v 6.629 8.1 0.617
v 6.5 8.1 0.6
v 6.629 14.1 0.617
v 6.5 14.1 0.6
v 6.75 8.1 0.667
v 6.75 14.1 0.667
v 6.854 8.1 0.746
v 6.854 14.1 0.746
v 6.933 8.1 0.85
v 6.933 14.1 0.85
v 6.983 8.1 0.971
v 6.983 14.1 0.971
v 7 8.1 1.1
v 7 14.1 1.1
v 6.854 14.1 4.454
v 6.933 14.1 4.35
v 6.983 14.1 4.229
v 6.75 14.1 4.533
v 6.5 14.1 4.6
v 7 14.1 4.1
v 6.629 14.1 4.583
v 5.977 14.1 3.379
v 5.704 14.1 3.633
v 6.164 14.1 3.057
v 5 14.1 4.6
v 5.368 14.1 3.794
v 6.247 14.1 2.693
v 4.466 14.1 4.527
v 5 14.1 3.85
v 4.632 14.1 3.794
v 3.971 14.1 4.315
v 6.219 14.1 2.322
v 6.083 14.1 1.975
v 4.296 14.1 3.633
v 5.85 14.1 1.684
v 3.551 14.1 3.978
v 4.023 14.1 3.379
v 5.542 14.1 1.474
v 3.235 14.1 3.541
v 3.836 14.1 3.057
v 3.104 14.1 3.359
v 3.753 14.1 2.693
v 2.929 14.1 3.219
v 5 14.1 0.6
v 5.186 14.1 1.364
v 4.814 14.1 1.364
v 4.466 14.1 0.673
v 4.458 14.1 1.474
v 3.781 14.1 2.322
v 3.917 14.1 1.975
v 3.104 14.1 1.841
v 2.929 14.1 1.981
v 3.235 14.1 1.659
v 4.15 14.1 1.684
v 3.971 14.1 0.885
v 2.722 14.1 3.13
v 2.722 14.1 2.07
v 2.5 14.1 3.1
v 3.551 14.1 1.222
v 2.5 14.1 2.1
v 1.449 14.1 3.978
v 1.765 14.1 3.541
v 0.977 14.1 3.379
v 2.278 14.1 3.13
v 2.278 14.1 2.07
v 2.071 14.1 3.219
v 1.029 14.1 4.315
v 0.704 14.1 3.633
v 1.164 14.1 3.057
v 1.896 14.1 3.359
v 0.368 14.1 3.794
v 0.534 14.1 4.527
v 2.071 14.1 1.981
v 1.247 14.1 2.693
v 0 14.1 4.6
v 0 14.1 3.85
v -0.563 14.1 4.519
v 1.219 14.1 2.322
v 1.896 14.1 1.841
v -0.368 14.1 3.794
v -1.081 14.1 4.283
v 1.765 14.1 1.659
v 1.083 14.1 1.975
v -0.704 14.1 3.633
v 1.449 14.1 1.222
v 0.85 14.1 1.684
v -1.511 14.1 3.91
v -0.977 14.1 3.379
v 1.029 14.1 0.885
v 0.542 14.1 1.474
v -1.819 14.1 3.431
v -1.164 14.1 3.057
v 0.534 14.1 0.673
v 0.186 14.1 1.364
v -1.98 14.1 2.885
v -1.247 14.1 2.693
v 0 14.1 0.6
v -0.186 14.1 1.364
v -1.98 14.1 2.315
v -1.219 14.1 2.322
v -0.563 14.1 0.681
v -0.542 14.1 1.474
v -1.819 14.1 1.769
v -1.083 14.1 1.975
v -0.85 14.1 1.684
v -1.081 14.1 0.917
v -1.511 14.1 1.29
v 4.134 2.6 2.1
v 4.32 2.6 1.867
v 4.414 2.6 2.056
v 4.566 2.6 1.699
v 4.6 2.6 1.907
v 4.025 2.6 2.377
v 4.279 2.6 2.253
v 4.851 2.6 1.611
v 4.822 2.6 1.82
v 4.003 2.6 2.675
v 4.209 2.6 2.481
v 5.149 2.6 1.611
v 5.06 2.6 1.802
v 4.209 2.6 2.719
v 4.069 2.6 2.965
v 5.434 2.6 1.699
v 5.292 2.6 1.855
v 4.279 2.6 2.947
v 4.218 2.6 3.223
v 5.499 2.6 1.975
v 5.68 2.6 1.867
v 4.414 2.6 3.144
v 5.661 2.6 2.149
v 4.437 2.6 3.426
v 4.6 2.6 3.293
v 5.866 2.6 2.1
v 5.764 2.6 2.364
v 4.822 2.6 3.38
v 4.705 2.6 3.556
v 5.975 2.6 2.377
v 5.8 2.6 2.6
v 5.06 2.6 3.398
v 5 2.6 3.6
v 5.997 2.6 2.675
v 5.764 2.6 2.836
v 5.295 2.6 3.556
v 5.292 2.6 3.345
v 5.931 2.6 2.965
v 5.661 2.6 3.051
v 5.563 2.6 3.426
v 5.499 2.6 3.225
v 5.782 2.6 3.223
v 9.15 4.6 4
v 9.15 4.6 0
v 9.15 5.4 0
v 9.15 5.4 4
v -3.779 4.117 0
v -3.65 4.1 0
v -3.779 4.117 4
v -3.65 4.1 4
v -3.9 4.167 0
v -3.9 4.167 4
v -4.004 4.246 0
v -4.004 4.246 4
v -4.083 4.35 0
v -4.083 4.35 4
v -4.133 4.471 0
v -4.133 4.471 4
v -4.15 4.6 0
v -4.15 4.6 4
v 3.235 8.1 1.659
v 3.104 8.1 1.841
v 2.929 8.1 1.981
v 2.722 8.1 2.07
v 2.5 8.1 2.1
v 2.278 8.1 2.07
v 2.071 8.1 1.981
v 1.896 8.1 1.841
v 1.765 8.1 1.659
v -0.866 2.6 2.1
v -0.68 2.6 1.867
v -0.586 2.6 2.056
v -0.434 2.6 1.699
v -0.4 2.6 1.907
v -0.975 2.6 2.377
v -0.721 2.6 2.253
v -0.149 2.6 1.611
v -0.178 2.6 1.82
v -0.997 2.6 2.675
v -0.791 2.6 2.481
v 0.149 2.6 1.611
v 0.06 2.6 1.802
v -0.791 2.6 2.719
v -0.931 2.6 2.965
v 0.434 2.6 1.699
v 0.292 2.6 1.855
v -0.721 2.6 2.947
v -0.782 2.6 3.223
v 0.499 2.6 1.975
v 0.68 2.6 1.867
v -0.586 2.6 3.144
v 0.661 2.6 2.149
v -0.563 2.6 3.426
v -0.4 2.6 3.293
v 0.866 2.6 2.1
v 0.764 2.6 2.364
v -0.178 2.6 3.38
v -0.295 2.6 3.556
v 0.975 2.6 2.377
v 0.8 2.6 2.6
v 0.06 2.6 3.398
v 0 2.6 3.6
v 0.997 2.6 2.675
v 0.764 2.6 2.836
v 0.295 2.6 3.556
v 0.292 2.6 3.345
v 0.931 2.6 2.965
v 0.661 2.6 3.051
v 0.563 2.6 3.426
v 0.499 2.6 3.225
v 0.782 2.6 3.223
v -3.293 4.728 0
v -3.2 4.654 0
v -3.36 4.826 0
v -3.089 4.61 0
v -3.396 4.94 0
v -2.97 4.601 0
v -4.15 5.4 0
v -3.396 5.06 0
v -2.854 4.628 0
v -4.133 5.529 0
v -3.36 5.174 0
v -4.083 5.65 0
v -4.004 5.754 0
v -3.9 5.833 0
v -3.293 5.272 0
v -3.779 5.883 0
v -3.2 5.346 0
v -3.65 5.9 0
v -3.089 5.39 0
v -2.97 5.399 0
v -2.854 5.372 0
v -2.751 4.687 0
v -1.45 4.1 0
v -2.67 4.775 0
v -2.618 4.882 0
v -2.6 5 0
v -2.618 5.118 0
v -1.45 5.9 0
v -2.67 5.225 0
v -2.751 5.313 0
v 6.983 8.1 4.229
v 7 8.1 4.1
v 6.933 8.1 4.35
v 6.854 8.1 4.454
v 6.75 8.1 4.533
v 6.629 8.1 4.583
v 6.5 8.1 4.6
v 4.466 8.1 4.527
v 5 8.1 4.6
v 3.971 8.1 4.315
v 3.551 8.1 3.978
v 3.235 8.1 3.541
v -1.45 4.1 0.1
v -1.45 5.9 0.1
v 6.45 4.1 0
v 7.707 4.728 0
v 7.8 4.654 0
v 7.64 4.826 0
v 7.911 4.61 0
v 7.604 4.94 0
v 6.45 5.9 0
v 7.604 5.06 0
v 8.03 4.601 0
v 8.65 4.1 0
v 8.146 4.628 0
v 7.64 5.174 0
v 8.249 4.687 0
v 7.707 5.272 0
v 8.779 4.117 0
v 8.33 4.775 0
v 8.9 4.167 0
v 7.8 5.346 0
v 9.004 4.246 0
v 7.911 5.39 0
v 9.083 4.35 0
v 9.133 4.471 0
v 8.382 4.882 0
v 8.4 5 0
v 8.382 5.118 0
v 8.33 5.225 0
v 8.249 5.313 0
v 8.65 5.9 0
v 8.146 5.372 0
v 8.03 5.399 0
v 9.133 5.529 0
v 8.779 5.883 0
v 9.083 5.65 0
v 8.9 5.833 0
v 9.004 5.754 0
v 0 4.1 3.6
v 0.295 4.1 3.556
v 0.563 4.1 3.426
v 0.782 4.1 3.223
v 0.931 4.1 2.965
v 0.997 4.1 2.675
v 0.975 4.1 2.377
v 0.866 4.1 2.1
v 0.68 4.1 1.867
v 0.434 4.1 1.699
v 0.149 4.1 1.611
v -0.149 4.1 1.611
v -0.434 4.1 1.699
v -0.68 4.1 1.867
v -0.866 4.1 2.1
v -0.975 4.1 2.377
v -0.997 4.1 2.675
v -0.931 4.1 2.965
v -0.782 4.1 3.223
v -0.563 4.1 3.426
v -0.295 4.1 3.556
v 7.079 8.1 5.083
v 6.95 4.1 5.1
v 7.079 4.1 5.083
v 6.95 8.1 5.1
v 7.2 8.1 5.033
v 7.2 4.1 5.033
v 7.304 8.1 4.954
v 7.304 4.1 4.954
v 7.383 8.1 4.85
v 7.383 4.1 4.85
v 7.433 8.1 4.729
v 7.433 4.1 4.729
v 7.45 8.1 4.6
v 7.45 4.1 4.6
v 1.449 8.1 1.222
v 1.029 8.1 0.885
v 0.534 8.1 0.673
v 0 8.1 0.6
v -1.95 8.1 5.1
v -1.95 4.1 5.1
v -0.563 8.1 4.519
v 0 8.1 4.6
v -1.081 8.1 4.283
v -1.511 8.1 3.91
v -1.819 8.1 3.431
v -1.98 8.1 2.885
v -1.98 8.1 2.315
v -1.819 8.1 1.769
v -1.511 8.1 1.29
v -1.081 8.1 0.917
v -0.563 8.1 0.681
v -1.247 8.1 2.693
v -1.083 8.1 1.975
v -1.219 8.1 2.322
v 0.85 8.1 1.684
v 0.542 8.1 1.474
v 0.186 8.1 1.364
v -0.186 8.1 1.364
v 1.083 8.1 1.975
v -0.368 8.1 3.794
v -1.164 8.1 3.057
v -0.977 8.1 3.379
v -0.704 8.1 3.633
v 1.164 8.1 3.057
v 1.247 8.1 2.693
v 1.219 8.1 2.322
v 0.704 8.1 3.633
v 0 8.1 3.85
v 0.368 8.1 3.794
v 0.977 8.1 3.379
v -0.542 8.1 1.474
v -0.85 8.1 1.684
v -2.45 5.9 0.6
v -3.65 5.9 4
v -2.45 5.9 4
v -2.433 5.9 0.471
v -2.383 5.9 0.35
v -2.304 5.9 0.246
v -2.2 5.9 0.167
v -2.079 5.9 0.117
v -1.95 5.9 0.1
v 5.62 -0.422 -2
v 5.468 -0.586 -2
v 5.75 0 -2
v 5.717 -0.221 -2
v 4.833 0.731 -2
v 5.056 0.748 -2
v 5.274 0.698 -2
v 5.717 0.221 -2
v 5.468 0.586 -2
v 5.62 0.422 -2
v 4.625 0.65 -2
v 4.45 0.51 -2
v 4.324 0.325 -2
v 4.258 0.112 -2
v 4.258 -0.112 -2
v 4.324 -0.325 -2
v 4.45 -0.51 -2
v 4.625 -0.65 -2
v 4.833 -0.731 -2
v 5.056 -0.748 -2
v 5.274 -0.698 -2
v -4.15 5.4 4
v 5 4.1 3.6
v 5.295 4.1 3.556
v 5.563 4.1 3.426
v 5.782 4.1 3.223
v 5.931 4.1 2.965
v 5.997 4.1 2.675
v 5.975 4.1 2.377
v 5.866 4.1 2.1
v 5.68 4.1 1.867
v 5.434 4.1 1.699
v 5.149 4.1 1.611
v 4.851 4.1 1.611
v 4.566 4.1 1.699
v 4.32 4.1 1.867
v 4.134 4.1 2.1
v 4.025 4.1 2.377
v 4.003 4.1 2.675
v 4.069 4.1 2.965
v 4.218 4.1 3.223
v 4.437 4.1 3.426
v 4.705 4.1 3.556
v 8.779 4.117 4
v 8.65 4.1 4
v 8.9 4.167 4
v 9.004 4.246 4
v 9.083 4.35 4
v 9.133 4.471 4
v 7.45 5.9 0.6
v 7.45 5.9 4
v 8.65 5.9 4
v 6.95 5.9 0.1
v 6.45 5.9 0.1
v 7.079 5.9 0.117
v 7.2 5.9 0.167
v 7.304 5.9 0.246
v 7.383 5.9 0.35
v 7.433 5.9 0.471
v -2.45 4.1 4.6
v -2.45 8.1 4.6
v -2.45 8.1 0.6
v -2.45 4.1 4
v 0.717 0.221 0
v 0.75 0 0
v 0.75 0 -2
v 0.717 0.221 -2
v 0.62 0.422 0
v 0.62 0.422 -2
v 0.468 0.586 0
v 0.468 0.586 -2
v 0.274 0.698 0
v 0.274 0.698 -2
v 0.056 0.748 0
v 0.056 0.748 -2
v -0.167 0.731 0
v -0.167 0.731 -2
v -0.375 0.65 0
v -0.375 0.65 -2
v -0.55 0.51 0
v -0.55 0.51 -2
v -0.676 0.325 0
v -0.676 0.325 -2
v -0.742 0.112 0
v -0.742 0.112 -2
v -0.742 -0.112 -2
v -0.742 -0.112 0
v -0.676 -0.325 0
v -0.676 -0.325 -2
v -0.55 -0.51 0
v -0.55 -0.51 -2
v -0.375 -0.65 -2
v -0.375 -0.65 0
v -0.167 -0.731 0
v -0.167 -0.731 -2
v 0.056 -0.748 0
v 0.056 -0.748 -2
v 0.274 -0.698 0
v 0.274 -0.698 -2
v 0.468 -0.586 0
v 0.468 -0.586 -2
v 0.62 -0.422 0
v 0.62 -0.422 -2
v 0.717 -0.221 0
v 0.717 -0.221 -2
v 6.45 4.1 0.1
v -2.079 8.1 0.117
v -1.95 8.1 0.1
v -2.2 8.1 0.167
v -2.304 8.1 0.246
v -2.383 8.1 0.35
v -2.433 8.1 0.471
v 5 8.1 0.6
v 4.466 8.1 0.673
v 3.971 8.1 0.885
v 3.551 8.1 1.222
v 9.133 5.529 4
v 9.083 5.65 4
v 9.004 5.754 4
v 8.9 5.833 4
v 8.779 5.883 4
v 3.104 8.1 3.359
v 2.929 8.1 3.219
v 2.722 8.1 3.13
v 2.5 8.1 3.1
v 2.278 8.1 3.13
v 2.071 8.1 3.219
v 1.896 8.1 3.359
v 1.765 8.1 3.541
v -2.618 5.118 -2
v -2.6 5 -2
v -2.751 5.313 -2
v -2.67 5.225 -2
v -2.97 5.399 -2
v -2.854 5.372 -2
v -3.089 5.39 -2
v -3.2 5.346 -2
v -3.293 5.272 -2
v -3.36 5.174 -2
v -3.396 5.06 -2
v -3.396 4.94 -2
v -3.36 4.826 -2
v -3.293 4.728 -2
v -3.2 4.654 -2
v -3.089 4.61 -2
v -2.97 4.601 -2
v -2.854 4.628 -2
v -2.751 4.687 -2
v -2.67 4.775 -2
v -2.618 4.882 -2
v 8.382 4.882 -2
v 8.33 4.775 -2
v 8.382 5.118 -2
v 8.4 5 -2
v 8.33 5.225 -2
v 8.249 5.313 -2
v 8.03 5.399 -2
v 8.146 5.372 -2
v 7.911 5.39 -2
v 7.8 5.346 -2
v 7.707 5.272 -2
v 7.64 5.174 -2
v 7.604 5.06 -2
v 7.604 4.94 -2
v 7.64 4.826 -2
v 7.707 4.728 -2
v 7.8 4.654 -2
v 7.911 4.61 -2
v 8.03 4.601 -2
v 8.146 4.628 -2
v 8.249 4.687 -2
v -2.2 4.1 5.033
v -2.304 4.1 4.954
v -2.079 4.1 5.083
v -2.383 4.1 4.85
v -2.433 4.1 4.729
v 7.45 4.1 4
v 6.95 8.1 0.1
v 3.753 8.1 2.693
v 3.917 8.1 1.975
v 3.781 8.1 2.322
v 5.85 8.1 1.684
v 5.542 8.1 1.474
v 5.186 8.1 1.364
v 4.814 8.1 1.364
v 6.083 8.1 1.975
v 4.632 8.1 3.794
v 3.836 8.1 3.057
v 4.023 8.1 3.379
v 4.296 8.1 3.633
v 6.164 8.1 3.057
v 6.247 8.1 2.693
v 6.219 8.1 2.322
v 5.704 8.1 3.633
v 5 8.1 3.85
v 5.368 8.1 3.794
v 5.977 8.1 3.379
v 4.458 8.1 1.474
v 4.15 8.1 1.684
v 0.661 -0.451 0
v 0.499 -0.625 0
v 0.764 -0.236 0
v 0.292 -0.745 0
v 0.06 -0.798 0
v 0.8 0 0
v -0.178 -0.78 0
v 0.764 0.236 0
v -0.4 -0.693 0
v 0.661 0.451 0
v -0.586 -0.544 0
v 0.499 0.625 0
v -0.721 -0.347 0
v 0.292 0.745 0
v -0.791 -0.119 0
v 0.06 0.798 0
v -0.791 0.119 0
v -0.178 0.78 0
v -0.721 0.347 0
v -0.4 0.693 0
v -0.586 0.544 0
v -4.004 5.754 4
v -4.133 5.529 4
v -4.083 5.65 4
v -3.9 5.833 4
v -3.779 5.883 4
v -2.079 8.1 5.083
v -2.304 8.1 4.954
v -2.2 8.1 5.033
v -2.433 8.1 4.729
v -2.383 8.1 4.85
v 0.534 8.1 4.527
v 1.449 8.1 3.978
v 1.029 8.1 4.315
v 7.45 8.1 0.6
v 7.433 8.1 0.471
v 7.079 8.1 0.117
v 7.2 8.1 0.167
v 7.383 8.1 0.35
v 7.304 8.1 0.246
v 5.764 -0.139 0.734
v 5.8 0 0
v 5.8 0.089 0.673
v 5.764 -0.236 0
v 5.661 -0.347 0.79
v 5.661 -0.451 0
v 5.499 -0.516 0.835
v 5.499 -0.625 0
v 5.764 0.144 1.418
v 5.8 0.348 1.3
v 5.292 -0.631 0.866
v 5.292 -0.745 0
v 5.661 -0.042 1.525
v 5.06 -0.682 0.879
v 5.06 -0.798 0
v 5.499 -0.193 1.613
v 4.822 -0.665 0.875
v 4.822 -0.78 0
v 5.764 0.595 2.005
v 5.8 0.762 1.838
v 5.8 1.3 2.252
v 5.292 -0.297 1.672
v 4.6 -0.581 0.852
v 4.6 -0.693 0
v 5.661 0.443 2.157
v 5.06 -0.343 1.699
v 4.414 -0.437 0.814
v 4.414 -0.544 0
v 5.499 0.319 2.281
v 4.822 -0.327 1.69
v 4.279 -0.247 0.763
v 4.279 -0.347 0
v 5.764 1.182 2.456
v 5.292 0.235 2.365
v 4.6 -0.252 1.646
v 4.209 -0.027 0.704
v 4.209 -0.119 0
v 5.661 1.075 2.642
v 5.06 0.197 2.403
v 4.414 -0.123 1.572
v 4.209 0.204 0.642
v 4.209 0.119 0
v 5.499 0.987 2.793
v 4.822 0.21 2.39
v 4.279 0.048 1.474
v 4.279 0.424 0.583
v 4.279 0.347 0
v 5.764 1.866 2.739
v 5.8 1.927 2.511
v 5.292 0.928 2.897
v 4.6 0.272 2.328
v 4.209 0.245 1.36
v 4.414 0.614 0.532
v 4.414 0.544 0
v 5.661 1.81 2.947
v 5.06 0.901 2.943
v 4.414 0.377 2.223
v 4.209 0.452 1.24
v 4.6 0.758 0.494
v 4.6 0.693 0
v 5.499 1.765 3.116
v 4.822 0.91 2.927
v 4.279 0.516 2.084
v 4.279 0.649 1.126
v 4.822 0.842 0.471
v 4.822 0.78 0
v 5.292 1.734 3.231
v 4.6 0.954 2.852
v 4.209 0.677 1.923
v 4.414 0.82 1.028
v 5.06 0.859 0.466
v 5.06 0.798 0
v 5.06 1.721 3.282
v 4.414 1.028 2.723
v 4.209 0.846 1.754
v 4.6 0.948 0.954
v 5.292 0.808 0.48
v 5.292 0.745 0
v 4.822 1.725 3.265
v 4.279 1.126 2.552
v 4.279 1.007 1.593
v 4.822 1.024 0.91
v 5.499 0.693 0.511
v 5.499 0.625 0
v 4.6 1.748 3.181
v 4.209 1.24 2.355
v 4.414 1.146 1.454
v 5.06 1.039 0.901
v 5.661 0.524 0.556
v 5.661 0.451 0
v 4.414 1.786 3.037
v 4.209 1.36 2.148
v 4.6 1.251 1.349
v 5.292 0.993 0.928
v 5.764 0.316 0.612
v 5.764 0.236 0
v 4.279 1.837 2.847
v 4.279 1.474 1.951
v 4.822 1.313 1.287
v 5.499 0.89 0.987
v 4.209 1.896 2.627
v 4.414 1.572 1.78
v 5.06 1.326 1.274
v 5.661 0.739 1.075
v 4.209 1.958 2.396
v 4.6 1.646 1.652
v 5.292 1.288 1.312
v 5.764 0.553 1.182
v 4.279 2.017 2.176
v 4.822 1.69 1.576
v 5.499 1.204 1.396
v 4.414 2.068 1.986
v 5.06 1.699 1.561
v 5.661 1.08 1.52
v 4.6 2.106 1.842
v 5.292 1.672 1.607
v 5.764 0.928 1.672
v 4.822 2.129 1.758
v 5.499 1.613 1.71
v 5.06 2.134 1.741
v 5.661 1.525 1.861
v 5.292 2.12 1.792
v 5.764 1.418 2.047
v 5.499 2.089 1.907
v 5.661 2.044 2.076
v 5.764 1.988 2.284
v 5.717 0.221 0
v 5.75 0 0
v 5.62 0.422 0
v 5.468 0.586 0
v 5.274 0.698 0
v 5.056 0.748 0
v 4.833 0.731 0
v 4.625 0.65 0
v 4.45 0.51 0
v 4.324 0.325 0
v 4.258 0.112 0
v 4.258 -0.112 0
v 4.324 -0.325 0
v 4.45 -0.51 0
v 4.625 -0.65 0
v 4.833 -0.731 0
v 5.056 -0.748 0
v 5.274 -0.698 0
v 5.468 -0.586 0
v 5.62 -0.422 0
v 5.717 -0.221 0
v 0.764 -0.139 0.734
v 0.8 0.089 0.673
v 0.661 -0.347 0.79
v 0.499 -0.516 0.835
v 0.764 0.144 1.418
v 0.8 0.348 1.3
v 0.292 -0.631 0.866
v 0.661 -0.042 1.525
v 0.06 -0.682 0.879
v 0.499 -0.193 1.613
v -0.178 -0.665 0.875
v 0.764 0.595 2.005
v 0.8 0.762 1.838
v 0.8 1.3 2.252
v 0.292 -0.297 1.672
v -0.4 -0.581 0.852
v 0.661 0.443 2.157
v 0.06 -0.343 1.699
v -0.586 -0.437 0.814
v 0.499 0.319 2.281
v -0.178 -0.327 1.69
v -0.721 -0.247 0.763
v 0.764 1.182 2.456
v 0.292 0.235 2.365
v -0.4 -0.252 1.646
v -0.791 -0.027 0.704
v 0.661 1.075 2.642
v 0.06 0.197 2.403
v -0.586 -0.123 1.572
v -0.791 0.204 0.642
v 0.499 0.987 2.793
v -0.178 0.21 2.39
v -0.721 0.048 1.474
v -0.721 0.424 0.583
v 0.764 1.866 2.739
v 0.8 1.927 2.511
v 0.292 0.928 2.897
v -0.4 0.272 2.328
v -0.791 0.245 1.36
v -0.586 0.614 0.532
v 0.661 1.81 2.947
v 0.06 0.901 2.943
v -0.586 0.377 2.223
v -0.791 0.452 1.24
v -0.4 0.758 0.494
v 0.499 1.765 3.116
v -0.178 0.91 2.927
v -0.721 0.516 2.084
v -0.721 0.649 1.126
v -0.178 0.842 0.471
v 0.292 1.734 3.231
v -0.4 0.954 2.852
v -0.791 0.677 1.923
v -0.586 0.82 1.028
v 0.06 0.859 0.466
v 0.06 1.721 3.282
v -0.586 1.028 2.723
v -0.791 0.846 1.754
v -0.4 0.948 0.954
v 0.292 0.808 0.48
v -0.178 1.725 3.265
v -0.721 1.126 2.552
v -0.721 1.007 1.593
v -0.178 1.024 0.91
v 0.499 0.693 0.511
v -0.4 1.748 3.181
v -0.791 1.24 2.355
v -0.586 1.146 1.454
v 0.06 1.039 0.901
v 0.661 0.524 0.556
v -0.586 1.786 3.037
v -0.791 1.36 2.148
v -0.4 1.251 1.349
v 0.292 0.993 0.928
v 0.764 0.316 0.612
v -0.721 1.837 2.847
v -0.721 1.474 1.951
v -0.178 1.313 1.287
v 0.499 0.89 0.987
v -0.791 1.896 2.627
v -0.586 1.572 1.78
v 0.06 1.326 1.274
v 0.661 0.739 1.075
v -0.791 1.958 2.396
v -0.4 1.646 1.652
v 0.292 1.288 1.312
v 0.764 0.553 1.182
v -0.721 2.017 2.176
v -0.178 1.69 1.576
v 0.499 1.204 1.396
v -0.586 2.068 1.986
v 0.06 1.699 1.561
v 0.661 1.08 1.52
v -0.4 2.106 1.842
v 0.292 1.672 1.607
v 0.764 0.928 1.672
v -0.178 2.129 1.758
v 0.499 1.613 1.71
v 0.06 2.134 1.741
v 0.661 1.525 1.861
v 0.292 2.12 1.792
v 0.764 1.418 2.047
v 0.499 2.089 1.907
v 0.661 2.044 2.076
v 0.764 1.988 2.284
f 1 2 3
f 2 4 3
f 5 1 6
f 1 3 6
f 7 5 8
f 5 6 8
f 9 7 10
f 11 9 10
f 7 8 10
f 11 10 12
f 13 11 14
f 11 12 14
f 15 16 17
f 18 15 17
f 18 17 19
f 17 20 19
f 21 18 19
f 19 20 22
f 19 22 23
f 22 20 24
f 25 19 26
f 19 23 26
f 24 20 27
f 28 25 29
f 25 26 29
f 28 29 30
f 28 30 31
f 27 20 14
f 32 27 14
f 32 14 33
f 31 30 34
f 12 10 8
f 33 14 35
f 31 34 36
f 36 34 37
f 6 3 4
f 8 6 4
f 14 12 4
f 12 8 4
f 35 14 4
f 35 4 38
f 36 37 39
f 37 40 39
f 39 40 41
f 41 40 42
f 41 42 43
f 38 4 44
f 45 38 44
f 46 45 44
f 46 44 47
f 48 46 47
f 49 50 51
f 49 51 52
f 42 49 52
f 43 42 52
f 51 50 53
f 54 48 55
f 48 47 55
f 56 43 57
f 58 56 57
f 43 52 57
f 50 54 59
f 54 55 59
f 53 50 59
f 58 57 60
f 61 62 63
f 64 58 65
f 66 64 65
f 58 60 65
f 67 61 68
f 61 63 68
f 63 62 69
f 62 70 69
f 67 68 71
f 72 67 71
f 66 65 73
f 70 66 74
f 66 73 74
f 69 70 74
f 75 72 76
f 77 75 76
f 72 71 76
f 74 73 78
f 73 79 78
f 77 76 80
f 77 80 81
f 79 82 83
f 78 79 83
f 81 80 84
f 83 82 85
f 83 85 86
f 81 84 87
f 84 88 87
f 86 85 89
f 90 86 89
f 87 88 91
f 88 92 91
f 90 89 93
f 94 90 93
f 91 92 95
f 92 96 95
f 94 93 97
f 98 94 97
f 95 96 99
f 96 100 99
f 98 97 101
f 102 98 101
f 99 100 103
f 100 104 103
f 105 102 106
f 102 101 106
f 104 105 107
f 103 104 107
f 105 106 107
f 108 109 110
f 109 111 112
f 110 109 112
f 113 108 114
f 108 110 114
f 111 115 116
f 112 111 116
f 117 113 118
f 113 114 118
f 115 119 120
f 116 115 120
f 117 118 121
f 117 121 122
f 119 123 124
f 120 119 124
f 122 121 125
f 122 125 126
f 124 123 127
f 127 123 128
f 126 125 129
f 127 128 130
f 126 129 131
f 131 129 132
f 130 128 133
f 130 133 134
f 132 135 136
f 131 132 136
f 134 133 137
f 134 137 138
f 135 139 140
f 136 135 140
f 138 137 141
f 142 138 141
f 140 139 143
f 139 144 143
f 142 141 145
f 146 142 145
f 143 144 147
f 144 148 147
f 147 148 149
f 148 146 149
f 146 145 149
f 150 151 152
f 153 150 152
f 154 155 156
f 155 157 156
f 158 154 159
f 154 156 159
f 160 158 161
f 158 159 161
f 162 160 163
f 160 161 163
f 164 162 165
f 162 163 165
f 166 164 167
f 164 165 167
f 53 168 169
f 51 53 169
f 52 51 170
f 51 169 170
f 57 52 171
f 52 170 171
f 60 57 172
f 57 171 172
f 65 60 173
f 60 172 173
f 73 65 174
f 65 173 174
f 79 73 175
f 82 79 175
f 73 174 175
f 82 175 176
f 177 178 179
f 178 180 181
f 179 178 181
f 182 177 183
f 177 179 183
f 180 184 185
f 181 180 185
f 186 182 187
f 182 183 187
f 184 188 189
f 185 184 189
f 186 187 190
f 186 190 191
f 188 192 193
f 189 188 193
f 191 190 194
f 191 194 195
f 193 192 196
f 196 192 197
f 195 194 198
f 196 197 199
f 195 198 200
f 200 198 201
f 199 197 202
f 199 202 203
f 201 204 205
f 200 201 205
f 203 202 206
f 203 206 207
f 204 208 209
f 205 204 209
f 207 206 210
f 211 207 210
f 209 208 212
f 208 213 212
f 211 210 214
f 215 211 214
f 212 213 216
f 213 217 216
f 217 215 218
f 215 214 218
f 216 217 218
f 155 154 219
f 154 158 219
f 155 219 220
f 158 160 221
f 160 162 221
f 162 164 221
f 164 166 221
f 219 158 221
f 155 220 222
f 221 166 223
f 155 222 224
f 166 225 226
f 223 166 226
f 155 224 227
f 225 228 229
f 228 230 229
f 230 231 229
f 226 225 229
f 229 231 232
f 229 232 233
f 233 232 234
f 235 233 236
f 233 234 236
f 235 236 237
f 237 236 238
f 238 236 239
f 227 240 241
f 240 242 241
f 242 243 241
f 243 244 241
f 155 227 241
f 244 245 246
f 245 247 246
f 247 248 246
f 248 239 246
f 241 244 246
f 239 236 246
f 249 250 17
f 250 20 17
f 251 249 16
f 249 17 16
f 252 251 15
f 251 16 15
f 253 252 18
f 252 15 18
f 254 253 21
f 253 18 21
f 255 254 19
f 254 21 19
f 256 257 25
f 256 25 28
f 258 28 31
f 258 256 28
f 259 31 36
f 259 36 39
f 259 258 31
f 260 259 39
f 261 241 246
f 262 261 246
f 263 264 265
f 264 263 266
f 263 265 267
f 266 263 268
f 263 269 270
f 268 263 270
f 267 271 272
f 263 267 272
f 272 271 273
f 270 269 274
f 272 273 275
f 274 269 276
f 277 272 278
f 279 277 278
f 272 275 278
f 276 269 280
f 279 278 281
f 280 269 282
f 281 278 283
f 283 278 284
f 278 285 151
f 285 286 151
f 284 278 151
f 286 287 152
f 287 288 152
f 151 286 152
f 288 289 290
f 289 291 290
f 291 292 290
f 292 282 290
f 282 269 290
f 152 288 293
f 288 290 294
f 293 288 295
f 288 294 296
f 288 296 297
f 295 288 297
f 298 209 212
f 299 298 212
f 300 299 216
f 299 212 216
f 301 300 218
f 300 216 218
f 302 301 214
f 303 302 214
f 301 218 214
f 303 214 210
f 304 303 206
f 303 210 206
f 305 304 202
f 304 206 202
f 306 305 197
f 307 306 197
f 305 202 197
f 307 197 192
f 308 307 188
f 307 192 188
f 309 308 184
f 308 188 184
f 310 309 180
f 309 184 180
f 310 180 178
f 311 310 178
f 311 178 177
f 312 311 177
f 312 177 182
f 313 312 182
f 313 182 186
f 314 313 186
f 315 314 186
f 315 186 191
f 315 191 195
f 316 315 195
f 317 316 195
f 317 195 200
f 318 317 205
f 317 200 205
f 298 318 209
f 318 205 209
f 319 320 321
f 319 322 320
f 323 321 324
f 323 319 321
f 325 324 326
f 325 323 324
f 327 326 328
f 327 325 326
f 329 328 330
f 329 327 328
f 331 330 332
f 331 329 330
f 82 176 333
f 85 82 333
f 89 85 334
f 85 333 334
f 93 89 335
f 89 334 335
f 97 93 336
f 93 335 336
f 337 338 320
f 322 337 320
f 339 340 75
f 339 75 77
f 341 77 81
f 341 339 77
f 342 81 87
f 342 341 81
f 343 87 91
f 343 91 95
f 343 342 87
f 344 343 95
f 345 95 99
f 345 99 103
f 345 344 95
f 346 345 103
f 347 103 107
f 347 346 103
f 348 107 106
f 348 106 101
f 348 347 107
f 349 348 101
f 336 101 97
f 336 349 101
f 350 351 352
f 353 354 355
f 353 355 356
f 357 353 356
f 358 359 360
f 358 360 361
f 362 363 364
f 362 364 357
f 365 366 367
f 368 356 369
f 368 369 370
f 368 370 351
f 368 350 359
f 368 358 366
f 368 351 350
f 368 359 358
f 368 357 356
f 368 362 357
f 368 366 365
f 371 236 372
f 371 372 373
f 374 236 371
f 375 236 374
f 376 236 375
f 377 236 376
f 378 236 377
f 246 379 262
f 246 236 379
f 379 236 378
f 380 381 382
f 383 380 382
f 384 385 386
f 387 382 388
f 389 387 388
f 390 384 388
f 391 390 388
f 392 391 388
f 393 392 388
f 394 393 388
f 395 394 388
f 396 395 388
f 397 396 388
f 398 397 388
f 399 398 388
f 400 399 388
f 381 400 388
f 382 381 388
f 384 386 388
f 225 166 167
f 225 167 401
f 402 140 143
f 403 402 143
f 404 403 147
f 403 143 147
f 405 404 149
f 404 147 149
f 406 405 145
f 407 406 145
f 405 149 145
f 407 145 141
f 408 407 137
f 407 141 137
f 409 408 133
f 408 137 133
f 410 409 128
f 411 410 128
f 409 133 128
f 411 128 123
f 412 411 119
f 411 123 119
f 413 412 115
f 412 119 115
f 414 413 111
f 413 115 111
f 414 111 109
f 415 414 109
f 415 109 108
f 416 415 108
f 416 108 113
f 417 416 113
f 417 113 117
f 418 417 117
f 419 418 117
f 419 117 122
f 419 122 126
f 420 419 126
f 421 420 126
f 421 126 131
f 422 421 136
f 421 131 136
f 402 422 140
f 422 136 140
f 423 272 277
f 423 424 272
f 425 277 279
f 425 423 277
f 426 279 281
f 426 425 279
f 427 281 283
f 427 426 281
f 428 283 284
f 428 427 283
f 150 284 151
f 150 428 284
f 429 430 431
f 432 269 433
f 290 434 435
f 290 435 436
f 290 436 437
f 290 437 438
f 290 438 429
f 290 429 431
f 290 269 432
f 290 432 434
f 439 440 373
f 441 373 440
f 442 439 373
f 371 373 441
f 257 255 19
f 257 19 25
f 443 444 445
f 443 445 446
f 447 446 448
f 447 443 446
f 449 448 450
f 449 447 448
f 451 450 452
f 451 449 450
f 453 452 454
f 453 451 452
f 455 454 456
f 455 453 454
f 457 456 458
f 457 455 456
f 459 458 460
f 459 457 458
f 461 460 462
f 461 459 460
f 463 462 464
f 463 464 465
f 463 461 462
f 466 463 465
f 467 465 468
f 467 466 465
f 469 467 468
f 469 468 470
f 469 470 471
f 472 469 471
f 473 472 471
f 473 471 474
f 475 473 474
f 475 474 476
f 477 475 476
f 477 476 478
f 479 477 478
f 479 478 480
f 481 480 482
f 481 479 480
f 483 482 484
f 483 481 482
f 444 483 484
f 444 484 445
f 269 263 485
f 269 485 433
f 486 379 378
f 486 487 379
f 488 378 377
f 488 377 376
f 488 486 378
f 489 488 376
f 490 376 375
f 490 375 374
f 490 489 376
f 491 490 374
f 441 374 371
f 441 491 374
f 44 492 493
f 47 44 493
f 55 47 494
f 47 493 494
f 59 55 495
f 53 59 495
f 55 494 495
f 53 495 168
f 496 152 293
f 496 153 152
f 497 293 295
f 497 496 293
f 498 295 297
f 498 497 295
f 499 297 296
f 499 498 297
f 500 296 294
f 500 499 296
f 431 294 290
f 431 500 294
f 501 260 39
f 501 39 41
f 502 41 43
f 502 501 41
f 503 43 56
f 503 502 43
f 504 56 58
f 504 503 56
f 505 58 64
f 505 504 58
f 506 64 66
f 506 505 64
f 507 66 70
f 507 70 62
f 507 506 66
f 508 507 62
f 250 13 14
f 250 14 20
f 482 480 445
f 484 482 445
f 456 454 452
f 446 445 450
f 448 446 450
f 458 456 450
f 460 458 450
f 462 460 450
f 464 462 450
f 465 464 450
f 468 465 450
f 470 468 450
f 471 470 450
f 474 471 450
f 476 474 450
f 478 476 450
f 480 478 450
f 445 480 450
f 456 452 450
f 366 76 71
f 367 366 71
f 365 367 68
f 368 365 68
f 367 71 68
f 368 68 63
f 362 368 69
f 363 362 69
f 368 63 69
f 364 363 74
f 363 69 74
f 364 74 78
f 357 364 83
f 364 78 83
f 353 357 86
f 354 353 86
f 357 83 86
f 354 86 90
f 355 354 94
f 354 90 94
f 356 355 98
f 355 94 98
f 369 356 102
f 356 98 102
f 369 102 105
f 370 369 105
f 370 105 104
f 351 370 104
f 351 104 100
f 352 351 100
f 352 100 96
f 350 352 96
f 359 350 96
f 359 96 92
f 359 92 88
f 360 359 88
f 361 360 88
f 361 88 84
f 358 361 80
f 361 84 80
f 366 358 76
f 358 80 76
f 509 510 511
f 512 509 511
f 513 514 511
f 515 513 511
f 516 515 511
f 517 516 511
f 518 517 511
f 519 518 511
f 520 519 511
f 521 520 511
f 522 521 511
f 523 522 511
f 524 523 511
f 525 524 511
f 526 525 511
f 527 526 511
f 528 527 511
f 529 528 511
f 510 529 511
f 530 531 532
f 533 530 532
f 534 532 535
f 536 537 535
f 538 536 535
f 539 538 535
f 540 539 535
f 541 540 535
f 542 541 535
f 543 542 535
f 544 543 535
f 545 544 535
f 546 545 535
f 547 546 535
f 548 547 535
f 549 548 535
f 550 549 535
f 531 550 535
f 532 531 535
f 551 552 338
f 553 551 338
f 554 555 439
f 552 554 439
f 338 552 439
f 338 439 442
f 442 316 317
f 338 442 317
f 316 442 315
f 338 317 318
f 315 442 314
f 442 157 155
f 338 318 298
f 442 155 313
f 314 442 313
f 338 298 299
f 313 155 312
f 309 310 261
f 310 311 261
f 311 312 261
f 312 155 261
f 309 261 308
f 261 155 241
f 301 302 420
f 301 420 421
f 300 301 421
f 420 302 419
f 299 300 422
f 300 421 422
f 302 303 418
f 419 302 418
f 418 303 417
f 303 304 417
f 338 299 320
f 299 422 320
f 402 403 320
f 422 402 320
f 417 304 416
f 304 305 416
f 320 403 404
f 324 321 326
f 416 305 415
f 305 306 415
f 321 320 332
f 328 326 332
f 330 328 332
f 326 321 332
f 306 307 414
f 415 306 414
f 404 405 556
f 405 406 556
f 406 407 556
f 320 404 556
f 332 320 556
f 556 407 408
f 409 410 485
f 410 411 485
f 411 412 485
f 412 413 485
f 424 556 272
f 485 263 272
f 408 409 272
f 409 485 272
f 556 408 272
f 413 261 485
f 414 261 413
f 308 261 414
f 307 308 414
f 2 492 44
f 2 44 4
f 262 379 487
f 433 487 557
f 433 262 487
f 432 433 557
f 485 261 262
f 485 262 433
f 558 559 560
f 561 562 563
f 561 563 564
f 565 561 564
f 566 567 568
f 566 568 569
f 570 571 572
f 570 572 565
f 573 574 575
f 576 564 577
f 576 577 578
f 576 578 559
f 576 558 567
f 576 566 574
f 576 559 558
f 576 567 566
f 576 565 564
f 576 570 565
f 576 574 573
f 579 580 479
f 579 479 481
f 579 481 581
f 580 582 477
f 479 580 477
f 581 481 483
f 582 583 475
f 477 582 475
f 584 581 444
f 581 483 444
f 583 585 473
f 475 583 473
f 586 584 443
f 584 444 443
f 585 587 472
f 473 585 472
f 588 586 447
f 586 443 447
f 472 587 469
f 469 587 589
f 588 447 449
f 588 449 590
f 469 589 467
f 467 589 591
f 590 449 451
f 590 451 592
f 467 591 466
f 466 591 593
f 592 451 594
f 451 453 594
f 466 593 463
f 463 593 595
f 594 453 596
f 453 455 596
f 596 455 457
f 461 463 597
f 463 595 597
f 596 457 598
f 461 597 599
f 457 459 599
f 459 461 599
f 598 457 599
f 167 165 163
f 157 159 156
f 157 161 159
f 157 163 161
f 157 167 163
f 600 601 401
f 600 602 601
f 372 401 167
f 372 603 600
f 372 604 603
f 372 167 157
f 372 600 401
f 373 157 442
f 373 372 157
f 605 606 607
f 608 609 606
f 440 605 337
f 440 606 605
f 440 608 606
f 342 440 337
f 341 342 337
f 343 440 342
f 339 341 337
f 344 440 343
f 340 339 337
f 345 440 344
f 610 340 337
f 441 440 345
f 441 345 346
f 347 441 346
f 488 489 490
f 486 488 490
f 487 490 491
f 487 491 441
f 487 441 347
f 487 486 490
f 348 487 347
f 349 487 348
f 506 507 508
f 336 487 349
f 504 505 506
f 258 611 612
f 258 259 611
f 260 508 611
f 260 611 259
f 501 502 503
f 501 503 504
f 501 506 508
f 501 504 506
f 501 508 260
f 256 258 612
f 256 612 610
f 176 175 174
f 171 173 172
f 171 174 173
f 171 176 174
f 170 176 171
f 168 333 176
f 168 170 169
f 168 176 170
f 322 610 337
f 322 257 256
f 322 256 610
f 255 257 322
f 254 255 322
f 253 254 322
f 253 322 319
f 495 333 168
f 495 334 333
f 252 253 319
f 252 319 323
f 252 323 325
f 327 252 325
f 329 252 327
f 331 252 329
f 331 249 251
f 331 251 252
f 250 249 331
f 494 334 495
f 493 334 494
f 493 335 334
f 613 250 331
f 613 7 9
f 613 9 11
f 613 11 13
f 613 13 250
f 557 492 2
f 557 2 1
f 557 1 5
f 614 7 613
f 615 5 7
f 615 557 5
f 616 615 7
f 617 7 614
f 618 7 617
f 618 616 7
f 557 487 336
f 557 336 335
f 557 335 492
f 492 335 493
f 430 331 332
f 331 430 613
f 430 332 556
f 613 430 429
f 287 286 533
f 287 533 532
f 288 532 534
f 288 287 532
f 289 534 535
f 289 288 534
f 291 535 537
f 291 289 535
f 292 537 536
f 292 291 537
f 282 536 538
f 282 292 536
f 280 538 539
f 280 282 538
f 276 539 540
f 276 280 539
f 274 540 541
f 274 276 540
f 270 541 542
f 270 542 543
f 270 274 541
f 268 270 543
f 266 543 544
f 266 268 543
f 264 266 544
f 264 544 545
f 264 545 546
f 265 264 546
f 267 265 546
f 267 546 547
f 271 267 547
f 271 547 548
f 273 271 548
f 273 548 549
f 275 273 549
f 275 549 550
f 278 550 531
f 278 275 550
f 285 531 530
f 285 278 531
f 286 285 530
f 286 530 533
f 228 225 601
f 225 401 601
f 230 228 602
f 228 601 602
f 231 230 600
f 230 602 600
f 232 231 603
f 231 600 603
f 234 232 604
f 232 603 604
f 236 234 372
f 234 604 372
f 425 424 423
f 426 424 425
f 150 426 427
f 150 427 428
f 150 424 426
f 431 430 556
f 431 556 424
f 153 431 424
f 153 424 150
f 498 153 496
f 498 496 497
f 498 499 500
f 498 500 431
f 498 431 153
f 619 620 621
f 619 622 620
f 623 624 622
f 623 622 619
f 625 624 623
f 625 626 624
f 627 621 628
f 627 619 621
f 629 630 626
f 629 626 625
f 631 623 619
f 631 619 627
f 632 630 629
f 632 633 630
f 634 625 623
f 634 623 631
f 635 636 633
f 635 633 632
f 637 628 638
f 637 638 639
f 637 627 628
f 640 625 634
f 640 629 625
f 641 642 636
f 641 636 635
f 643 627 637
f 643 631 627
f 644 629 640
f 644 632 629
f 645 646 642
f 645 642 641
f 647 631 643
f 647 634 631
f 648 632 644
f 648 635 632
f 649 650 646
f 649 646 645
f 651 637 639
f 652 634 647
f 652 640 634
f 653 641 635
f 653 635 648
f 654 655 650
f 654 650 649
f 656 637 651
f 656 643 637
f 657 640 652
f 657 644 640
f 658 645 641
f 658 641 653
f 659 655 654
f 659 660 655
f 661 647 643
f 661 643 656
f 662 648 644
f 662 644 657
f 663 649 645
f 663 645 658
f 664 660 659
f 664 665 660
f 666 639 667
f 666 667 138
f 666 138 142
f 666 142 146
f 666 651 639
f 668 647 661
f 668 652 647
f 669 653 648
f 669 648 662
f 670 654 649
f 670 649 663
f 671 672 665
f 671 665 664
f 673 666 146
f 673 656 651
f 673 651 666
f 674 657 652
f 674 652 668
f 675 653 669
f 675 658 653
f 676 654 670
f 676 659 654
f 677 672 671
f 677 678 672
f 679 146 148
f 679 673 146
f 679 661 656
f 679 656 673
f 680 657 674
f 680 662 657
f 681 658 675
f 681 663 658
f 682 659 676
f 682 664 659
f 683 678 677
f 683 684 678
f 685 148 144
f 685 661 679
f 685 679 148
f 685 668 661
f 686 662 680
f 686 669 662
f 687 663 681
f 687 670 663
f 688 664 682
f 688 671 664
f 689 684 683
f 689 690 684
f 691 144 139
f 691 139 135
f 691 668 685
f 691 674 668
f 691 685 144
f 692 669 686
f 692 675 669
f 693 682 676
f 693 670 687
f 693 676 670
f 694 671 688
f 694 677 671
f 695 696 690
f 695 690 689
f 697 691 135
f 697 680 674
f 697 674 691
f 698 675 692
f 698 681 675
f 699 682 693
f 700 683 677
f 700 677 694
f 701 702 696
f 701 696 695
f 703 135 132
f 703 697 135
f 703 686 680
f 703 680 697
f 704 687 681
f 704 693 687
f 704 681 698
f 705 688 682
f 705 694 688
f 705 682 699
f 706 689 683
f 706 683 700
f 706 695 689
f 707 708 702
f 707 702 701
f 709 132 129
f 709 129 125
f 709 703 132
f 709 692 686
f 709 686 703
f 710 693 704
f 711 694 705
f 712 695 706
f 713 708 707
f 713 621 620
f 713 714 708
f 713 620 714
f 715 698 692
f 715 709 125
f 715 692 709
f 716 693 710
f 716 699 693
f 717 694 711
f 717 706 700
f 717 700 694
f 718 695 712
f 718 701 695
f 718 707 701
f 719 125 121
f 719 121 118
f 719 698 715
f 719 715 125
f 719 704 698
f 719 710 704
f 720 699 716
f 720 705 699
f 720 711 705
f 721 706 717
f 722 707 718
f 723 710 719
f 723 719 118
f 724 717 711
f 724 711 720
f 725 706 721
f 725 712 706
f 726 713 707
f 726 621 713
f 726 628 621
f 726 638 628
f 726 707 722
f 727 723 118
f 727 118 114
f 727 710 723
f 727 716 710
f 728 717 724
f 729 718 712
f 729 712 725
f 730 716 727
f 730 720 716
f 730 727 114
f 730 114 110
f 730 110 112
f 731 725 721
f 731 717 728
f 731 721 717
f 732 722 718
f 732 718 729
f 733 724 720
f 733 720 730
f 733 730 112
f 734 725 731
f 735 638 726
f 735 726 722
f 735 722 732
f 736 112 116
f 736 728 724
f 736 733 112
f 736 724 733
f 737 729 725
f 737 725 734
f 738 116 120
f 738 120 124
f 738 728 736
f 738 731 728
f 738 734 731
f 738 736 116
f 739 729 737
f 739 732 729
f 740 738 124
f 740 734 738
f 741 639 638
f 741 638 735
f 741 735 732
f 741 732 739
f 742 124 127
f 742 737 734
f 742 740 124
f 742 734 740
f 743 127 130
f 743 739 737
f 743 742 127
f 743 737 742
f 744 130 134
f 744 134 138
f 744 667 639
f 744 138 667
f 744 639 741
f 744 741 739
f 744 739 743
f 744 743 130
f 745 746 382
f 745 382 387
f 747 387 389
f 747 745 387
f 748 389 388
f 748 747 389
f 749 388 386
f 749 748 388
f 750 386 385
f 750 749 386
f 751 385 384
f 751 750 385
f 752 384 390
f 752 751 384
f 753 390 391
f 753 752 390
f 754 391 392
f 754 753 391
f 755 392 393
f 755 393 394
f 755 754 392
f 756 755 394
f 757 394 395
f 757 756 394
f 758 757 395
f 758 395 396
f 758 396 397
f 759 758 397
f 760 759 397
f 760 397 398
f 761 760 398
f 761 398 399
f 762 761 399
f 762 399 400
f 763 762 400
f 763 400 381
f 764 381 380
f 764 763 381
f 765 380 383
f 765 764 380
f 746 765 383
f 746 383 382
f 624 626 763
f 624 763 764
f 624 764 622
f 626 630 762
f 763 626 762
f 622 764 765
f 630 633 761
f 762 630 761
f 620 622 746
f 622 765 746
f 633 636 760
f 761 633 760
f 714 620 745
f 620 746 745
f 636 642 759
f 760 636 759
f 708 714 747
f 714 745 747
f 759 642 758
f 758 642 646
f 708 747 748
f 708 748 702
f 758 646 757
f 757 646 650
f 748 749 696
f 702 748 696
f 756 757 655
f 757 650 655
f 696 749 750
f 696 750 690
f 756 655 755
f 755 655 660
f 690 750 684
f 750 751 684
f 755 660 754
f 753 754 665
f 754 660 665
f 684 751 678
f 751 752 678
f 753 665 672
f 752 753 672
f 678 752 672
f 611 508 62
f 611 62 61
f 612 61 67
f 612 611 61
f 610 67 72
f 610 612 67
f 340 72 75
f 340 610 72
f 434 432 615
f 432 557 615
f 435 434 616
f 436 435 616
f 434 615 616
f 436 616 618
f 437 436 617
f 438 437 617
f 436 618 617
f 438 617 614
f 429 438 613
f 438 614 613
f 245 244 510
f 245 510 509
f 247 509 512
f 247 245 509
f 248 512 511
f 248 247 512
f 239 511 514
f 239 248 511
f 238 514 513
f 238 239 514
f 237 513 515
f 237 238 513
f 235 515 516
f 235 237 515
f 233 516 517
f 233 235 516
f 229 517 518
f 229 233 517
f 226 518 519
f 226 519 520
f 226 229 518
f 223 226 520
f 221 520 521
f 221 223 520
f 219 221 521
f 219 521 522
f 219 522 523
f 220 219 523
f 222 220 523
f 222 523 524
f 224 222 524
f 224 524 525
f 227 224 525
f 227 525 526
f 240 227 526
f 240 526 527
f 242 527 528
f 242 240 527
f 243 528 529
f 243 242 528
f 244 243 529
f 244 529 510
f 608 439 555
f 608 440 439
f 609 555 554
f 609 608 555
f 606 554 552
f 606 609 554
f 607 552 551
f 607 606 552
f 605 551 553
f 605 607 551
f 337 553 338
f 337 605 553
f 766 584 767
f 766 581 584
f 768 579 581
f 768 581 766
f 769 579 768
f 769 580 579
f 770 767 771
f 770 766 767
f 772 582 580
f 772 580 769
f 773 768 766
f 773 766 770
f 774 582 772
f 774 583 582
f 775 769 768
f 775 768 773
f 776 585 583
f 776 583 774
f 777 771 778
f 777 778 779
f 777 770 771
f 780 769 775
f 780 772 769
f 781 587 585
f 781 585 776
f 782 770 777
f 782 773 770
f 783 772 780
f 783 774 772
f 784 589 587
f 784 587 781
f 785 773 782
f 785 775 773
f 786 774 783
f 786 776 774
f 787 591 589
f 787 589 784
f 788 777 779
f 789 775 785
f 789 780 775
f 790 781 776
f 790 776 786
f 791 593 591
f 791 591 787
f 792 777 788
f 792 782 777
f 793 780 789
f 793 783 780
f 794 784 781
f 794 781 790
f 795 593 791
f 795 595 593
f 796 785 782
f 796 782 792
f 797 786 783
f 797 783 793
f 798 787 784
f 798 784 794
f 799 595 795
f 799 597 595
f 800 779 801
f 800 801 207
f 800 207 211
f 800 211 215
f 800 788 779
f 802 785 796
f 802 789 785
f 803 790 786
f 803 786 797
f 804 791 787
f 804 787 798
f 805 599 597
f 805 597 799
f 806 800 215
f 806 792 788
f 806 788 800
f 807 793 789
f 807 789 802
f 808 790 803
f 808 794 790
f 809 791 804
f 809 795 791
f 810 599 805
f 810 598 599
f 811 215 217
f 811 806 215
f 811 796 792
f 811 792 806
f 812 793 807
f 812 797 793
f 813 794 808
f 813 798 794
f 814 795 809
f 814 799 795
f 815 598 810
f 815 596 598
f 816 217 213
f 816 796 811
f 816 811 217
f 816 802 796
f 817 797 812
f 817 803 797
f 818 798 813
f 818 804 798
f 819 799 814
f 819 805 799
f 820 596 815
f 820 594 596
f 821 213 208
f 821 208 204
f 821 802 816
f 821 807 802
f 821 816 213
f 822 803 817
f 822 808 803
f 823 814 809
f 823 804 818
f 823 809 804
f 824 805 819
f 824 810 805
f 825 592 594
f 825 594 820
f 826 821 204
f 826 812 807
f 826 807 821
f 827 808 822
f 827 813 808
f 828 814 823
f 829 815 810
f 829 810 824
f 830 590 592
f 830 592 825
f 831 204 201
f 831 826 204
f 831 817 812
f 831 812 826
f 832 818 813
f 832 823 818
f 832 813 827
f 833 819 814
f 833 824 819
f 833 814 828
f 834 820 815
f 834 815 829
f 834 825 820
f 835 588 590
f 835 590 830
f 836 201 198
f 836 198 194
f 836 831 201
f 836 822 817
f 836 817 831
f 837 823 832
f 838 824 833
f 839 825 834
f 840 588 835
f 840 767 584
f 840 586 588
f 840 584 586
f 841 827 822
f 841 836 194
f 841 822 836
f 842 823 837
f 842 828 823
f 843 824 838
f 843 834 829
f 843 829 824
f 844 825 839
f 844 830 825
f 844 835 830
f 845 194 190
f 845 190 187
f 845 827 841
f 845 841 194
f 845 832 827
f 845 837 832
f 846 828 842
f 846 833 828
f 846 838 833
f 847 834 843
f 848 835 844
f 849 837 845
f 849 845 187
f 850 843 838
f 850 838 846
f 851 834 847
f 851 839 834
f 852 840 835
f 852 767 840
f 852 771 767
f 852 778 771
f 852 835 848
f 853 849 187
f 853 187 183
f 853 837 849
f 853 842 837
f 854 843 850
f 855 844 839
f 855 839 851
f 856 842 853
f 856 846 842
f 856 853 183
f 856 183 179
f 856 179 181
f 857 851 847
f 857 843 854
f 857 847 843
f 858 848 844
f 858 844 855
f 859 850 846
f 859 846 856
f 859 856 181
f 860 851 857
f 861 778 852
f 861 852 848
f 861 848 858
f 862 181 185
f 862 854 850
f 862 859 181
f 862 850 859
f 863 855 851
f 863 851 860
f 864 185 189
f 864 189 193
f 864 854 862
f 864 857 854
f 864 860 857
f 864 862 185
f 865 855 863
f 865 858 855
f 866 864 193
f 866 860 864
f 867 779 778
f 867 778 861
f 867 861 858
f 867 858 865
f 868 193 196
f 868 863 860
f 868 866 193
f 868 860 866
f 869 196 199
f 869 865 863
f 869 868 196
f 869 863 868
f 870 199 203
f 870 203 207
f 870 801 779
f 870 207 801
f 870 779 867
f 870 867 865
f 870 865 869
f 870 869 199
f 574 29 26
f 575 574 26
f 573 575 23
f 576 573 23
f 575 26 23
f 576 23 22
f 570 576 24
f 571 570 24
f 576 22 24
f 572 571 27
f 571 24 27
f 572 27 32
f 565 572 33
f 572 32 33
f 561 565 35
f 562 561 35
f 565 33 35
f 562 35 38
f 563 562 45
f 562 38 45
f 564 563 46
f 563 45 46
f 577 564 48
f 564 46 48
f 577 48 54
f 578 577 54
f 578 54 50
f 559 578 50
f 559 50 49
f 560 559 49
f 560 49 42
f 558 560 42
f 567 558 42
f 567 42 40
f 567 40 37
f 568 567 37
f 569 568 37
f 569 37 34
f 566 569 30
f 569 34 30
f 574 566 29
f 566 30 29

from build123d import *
from build123d.topology import SkipClean

# Parameters (mm, degrees)
SKETCH_1_R             = 0.75
EXTRUDE_1_DEPTH        = 2
SKETCH_2_R             = 0.8
SKETCH_4_R             = 1
EXTRUDE_2_DEPTH        = 1.5
SKETCH_5_W             = 9.9
SKETCH_5_H             = 5
EXTRUDE_3_DEPTH        = 4
SKETCH_8_R             = 0.4
EXTRUDE_5_DEPTH        = 2
EXTRUDE_5_2_DEPTH      = 2
SKETCH_9_W             = 2.7
SKETCH_9_H             = 1.8
EXTRUDE_6_DEPTH        = 4
EXTRUDE_4_DEPTH        = 6
SKETCH_7_R             = 1.25
CUT_EXTRUDE_1_DEPTH    = 6
PATTERN_LINEAR_1_COUNT = 2
PATTERN_LINEAR_1_PITCH = 5
CUT_EXTRUDE_START      = -6
CUT_EXTRUDE_2_DEPTH    = 6
FILLET_1_R             = 0.5
FILLET_2_R             = 0.5
FILLET_3_R             = 0.5


with BuildPart() as part:
    # ｽｹｯﾁ1 → ﾎﾞｽ - 押し出し1 (new body)
    with BuildSketch(Plane.XY):
        Circle(SKETCH_1_R)
    extrude_1 = extrude(amount=-EXTRUDE_1_DEPTH)

    # ｽｲｰﾌﾟ1: sweep along a path in ｽｹｯﾁ3
    with BuildLine(Plane(origin=(0, 0, 0), x_dir=(0, 0, -1), z_dir=(1, 0, 0))) as sweep_1_path:
        ThreePointArc((0, 0), (-1.838477631, 0.761522369), (-2.6, 2.6))
    # ｽｹｯﾁ2 → ｽｲｰﾌﾟ1 (sweep)
    with BuildSketch(Plane.XY):
        Circle(SKETCH_2_R)
    sweep_1 = sweep(path=sweep_1_path.line)

    # ｽｹｯﾁ4 → ﾎﾞｽ - 押し出し2 (add)
    with BuildSketch(Plane(origin=(0, 2.6, 0), x_dir=(1, 0, 0), z_dir=(0, 1, 0))):
        with Locations(Location((0, -2.6, 0), (0, 0, 270))):
            Circle(SKETCH_4_R)
    extrude_2 = extrude(amount=EXTRUDE_2_DEPTH)

    # ｽｹｯﾁ5 → ﾎﾞｽ - 押し出し3 (add)
    with BuildSketch(Plane(origin=(0, 4.1, 0), x_dir=(1, 0, 0), z_dir=(0, 1, 0))):
        with Locations((2.5, -2.6)):
            Rectangle(SKETCH_5_W, SKETCH_5_H)
    extrude(amount=EXTRUDE_3_DEPTH)



with BuildPart() as body_2:
    # ｽｹｯﾁ8 → ﾎﾞｽ - 押し出し5 (new body)
    with BuildSketch(Plane.XY):
        with Locations((-3, 5)):
            Circle(SKETCH_8_R)
    extrude(amount=-EXTRUDE_5_DEPTH)


with BuildPart() as body_3:
    # ｽｹｯﾁ8 → Extrude 5 2 (new body)
    with BuildSketch(Plane.XY):
        with Locations((8, 5)):
            Circle(SKETCH_8_R)
    extrude(amount=-EXTRUDE_5_2_DEPTH)


with BuildPart() as part_1:
    add(part.part)

    add(body_2.part)  # ﾎﾞｽ - 押し出し6 merges body 2

    add(body_3.part)  # ﾎﾞｽ - 押し出し6 merges body 3
    # ｽｹｯﾁ9 → ﾎﾞｽ - 押し出し6 (add)
    with BuildSketch(Plane.XY):
        with Locations((-2.8, 5)):
            Rectangle(SKETCH_9_W, SKETCH_9_H)
        with Locations((7.8, 5)):
            Rectangle(SKETCH_9_W, SKETCH_9_H)
    extrude(amount=EXTRUDE_6_DEPTH)

    # ｽｹｯﾁ6 → ﾎﾞｽ - 押し出し4 (add)
    with BuildSketch(Plane(origin=(0, 8.1, 0), x_dir=(1, 0, 0), z_dir=(0, 1, 0))):
        with BuildLine():
            Line((0, -0.6), (7, -0.6))
            Line((7, -0.6), (7, -4.6))
            Line((7, -4.6), (0, -4.6))
            ThreePointArc((0, -4.6), (-2, -2.6), (0, -0.6))
        make_face()
    extrude(amount=EXTRUDE_4_DEPTH)

    # ｽｹｯﾁ7 → ｶｯﾄ - 押し出し1 (cut)
    with BuildSketch(Plane(origin=(0, 14.1, 0), x_dir=(1, 0, 0), z_dir=(0, 1, 0))):
        with Locations(Location((0, -2.6, 0), (0, 0, 270))):
            Circle(SKETCH_7_R)
    cut_extrude_1 = extrude(amount=-CUT_EXTRUDE_1_DEPTH, mode=Mode.SUBTRACT)

    # 直線ﾊﾟﾀｰﾝ1: ﾎﾞｽ - 押し出し1, ｽｲｰﾌﾟ1, ﾎﾞｽ - 押し出し2, ｶｯﾄ - 押し出し1 ×2
    with Locations(*[(i * PATTERN_LINEAR_1_PITCH, 0, 0) for i in range(1, PATTERN_LINEAR_1_COUNT)]):
        add(extrude_1)
        add(sweep_1)
        add(extrude_2)
        add(cut_extrude_1, mode=Mode.SUBTRACT)

    # ｽｹｯﾁ10 → ｶｯﾄ - 押し出し2 (cut)
    with SkipClean():  # the faces are left unmerged after this step: merging them gives an invalid solid
        with BuildSketch(Plane(origin=(0, 14.1, 0), x_dir=(1, 0, 0), z_dir=(0, 1, 0)).offset(CUT_EXTRUDE_START)):
            with BuildLine():
                Line((0, -0.6), (5, -0.6))
                ThreePointArc((5, -0.6), (3.971008489, -0.885014149), (3.235294118, -1.658823529))
                ThreePointArc((3.235294118, -1.658823529), (2.5, -2.1), (1.764705882, -1.658823529))
                ThreePointArc((1.764705882, -1.658823529), (1.028991511, -0.885014149), (0, -0.6))
            make_face()
        cut_extrude_2 = extrude(amount=CUT_EXTRUDE_2_DEPTH, mode=Mode.SUBTRACT)

    # ﾐﾗｰ1: ｶｯﾄ - 押し出し2 across plane
    with SkipClean():  # the faces are left unmerged after this step: merging them gives an invalid solid
        add(cut_extrude_2.mirror(Plane.XY.offset(2.6)), mode=Mode.SUBTRACT)

    # ﾌｨﾚｯﾄ1
    fillet_1_edges = [part_1.edges().sort_by_distance(p)[0] for p in [
        (-4.15, 4.1, 2),
        (-4.15, 5.9, 2),
        (9.15, 5.9, 2),
        (9.15, 4.1, 2),
    ]]
    fillet(fillet_1_edges, radius=FILLET_1_R)

    # ﾌｨﾚｯﾄ2
    fillet_2_edges = [part_1.edges().sort_by_distance(p)[0] for p in [
        (7.45, 7, 0.1),
        (-2.45, 7, 0.1),
        (-2.45, 6.1, 5.1),
        (7.45, 6.1, 5.1),
    ]]
    fillet(fillet_2_edges, radius=FILLET_2_R)

    # ﾌｨﾚｯﾄ3
    fillet_3_edges = [part_1.edges().sort_by_distance(p)[0] for p in [
        (7, 11.1, 4.6),
        (7, 11.1, 0.6),
    ]]
    fillet(fillet_3_edges, radius=FILLET_3_R)


solid = part_1.part
